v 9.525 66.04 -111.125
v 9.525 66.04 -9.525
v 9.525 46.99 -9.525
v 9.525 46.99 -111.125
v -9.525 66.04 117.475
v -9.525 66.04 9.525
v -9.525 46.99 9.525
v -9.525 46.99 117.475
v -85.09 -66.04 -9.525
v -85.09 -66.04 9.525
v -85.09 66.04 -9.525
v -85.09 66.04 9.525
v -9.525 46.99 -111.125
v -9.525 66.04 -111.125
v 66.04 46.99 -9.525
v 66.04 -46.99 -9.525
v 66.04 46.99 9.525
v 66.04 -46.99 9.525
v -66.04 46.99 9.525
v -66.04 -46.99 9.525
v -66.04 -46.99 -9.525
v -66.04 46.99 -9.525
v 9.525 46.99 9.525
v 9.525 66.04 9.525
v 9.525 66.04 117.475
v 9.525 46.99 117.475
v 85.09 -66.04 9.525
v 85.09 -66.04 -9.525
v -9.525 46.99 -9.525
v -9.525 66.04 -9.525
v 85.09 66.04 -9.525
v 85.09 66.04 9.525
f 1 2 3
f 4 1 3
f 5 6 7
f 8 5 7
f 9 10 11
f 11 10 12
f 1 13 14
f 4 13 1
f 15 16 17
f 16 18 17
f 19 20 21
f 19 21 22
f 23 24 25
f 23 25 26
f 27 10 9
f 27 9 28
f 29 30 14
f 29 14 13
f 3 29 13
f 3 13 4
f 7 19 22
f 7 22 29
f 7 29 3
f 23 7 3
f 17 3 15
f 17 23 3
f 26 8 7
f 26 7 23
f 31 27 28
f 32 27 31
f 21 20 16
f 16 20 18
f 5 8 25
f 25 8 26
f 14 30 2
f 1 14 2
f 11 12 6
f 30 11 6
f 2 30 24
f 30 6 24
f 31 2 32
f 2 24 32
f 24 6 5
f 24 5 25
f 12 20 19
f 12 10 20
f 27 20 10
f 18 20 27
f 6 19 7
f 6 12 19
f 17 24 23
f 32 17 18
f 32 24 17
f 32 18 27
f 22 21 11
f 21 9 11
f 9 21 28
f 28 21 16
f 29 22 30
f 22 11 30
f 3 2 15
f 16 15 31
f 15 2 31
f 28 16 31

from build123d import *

# Parameters (mm, degrees)
F0_W          = 170.18
F0_H          = 132.08
F0_W_2        = 132.08
F0_H_2        = 93.98
F1_DEPTH      = 9.525
F2_W          = 19.05
F2_H          = 19.05
F3_DEPTH      = 101.6
F3_DEPTH_BACK = 127


with BuildPart() as f1:
    # F0 (on Top) → F1 (new body, symmetric)
    with BuildSketch(Plane.XY):
        Rectangle(F0_W, F0_H)
        Rectangle(F0_W_2, F0_H_2, mode=Mode.SUBTRACT)
    extrude(amount=F1_DEPTH, both=True)

    # F2 (on face) → F3 (join, two sides)
    with BuildSketch(Plane(origin=(0, 0, -9.525), x_dir=(1, 0, 0), z_dir=(0, 0, -1))) as f3_sk:
        with Locations((0, -56.515)):
            Rectangle(F2_W, F2_H)
    extrude(amount=F3_DEPTH)
    extrude(f3_sk.sketch, amount=-F3_DEPTH_BACK)


solid = f1.part
